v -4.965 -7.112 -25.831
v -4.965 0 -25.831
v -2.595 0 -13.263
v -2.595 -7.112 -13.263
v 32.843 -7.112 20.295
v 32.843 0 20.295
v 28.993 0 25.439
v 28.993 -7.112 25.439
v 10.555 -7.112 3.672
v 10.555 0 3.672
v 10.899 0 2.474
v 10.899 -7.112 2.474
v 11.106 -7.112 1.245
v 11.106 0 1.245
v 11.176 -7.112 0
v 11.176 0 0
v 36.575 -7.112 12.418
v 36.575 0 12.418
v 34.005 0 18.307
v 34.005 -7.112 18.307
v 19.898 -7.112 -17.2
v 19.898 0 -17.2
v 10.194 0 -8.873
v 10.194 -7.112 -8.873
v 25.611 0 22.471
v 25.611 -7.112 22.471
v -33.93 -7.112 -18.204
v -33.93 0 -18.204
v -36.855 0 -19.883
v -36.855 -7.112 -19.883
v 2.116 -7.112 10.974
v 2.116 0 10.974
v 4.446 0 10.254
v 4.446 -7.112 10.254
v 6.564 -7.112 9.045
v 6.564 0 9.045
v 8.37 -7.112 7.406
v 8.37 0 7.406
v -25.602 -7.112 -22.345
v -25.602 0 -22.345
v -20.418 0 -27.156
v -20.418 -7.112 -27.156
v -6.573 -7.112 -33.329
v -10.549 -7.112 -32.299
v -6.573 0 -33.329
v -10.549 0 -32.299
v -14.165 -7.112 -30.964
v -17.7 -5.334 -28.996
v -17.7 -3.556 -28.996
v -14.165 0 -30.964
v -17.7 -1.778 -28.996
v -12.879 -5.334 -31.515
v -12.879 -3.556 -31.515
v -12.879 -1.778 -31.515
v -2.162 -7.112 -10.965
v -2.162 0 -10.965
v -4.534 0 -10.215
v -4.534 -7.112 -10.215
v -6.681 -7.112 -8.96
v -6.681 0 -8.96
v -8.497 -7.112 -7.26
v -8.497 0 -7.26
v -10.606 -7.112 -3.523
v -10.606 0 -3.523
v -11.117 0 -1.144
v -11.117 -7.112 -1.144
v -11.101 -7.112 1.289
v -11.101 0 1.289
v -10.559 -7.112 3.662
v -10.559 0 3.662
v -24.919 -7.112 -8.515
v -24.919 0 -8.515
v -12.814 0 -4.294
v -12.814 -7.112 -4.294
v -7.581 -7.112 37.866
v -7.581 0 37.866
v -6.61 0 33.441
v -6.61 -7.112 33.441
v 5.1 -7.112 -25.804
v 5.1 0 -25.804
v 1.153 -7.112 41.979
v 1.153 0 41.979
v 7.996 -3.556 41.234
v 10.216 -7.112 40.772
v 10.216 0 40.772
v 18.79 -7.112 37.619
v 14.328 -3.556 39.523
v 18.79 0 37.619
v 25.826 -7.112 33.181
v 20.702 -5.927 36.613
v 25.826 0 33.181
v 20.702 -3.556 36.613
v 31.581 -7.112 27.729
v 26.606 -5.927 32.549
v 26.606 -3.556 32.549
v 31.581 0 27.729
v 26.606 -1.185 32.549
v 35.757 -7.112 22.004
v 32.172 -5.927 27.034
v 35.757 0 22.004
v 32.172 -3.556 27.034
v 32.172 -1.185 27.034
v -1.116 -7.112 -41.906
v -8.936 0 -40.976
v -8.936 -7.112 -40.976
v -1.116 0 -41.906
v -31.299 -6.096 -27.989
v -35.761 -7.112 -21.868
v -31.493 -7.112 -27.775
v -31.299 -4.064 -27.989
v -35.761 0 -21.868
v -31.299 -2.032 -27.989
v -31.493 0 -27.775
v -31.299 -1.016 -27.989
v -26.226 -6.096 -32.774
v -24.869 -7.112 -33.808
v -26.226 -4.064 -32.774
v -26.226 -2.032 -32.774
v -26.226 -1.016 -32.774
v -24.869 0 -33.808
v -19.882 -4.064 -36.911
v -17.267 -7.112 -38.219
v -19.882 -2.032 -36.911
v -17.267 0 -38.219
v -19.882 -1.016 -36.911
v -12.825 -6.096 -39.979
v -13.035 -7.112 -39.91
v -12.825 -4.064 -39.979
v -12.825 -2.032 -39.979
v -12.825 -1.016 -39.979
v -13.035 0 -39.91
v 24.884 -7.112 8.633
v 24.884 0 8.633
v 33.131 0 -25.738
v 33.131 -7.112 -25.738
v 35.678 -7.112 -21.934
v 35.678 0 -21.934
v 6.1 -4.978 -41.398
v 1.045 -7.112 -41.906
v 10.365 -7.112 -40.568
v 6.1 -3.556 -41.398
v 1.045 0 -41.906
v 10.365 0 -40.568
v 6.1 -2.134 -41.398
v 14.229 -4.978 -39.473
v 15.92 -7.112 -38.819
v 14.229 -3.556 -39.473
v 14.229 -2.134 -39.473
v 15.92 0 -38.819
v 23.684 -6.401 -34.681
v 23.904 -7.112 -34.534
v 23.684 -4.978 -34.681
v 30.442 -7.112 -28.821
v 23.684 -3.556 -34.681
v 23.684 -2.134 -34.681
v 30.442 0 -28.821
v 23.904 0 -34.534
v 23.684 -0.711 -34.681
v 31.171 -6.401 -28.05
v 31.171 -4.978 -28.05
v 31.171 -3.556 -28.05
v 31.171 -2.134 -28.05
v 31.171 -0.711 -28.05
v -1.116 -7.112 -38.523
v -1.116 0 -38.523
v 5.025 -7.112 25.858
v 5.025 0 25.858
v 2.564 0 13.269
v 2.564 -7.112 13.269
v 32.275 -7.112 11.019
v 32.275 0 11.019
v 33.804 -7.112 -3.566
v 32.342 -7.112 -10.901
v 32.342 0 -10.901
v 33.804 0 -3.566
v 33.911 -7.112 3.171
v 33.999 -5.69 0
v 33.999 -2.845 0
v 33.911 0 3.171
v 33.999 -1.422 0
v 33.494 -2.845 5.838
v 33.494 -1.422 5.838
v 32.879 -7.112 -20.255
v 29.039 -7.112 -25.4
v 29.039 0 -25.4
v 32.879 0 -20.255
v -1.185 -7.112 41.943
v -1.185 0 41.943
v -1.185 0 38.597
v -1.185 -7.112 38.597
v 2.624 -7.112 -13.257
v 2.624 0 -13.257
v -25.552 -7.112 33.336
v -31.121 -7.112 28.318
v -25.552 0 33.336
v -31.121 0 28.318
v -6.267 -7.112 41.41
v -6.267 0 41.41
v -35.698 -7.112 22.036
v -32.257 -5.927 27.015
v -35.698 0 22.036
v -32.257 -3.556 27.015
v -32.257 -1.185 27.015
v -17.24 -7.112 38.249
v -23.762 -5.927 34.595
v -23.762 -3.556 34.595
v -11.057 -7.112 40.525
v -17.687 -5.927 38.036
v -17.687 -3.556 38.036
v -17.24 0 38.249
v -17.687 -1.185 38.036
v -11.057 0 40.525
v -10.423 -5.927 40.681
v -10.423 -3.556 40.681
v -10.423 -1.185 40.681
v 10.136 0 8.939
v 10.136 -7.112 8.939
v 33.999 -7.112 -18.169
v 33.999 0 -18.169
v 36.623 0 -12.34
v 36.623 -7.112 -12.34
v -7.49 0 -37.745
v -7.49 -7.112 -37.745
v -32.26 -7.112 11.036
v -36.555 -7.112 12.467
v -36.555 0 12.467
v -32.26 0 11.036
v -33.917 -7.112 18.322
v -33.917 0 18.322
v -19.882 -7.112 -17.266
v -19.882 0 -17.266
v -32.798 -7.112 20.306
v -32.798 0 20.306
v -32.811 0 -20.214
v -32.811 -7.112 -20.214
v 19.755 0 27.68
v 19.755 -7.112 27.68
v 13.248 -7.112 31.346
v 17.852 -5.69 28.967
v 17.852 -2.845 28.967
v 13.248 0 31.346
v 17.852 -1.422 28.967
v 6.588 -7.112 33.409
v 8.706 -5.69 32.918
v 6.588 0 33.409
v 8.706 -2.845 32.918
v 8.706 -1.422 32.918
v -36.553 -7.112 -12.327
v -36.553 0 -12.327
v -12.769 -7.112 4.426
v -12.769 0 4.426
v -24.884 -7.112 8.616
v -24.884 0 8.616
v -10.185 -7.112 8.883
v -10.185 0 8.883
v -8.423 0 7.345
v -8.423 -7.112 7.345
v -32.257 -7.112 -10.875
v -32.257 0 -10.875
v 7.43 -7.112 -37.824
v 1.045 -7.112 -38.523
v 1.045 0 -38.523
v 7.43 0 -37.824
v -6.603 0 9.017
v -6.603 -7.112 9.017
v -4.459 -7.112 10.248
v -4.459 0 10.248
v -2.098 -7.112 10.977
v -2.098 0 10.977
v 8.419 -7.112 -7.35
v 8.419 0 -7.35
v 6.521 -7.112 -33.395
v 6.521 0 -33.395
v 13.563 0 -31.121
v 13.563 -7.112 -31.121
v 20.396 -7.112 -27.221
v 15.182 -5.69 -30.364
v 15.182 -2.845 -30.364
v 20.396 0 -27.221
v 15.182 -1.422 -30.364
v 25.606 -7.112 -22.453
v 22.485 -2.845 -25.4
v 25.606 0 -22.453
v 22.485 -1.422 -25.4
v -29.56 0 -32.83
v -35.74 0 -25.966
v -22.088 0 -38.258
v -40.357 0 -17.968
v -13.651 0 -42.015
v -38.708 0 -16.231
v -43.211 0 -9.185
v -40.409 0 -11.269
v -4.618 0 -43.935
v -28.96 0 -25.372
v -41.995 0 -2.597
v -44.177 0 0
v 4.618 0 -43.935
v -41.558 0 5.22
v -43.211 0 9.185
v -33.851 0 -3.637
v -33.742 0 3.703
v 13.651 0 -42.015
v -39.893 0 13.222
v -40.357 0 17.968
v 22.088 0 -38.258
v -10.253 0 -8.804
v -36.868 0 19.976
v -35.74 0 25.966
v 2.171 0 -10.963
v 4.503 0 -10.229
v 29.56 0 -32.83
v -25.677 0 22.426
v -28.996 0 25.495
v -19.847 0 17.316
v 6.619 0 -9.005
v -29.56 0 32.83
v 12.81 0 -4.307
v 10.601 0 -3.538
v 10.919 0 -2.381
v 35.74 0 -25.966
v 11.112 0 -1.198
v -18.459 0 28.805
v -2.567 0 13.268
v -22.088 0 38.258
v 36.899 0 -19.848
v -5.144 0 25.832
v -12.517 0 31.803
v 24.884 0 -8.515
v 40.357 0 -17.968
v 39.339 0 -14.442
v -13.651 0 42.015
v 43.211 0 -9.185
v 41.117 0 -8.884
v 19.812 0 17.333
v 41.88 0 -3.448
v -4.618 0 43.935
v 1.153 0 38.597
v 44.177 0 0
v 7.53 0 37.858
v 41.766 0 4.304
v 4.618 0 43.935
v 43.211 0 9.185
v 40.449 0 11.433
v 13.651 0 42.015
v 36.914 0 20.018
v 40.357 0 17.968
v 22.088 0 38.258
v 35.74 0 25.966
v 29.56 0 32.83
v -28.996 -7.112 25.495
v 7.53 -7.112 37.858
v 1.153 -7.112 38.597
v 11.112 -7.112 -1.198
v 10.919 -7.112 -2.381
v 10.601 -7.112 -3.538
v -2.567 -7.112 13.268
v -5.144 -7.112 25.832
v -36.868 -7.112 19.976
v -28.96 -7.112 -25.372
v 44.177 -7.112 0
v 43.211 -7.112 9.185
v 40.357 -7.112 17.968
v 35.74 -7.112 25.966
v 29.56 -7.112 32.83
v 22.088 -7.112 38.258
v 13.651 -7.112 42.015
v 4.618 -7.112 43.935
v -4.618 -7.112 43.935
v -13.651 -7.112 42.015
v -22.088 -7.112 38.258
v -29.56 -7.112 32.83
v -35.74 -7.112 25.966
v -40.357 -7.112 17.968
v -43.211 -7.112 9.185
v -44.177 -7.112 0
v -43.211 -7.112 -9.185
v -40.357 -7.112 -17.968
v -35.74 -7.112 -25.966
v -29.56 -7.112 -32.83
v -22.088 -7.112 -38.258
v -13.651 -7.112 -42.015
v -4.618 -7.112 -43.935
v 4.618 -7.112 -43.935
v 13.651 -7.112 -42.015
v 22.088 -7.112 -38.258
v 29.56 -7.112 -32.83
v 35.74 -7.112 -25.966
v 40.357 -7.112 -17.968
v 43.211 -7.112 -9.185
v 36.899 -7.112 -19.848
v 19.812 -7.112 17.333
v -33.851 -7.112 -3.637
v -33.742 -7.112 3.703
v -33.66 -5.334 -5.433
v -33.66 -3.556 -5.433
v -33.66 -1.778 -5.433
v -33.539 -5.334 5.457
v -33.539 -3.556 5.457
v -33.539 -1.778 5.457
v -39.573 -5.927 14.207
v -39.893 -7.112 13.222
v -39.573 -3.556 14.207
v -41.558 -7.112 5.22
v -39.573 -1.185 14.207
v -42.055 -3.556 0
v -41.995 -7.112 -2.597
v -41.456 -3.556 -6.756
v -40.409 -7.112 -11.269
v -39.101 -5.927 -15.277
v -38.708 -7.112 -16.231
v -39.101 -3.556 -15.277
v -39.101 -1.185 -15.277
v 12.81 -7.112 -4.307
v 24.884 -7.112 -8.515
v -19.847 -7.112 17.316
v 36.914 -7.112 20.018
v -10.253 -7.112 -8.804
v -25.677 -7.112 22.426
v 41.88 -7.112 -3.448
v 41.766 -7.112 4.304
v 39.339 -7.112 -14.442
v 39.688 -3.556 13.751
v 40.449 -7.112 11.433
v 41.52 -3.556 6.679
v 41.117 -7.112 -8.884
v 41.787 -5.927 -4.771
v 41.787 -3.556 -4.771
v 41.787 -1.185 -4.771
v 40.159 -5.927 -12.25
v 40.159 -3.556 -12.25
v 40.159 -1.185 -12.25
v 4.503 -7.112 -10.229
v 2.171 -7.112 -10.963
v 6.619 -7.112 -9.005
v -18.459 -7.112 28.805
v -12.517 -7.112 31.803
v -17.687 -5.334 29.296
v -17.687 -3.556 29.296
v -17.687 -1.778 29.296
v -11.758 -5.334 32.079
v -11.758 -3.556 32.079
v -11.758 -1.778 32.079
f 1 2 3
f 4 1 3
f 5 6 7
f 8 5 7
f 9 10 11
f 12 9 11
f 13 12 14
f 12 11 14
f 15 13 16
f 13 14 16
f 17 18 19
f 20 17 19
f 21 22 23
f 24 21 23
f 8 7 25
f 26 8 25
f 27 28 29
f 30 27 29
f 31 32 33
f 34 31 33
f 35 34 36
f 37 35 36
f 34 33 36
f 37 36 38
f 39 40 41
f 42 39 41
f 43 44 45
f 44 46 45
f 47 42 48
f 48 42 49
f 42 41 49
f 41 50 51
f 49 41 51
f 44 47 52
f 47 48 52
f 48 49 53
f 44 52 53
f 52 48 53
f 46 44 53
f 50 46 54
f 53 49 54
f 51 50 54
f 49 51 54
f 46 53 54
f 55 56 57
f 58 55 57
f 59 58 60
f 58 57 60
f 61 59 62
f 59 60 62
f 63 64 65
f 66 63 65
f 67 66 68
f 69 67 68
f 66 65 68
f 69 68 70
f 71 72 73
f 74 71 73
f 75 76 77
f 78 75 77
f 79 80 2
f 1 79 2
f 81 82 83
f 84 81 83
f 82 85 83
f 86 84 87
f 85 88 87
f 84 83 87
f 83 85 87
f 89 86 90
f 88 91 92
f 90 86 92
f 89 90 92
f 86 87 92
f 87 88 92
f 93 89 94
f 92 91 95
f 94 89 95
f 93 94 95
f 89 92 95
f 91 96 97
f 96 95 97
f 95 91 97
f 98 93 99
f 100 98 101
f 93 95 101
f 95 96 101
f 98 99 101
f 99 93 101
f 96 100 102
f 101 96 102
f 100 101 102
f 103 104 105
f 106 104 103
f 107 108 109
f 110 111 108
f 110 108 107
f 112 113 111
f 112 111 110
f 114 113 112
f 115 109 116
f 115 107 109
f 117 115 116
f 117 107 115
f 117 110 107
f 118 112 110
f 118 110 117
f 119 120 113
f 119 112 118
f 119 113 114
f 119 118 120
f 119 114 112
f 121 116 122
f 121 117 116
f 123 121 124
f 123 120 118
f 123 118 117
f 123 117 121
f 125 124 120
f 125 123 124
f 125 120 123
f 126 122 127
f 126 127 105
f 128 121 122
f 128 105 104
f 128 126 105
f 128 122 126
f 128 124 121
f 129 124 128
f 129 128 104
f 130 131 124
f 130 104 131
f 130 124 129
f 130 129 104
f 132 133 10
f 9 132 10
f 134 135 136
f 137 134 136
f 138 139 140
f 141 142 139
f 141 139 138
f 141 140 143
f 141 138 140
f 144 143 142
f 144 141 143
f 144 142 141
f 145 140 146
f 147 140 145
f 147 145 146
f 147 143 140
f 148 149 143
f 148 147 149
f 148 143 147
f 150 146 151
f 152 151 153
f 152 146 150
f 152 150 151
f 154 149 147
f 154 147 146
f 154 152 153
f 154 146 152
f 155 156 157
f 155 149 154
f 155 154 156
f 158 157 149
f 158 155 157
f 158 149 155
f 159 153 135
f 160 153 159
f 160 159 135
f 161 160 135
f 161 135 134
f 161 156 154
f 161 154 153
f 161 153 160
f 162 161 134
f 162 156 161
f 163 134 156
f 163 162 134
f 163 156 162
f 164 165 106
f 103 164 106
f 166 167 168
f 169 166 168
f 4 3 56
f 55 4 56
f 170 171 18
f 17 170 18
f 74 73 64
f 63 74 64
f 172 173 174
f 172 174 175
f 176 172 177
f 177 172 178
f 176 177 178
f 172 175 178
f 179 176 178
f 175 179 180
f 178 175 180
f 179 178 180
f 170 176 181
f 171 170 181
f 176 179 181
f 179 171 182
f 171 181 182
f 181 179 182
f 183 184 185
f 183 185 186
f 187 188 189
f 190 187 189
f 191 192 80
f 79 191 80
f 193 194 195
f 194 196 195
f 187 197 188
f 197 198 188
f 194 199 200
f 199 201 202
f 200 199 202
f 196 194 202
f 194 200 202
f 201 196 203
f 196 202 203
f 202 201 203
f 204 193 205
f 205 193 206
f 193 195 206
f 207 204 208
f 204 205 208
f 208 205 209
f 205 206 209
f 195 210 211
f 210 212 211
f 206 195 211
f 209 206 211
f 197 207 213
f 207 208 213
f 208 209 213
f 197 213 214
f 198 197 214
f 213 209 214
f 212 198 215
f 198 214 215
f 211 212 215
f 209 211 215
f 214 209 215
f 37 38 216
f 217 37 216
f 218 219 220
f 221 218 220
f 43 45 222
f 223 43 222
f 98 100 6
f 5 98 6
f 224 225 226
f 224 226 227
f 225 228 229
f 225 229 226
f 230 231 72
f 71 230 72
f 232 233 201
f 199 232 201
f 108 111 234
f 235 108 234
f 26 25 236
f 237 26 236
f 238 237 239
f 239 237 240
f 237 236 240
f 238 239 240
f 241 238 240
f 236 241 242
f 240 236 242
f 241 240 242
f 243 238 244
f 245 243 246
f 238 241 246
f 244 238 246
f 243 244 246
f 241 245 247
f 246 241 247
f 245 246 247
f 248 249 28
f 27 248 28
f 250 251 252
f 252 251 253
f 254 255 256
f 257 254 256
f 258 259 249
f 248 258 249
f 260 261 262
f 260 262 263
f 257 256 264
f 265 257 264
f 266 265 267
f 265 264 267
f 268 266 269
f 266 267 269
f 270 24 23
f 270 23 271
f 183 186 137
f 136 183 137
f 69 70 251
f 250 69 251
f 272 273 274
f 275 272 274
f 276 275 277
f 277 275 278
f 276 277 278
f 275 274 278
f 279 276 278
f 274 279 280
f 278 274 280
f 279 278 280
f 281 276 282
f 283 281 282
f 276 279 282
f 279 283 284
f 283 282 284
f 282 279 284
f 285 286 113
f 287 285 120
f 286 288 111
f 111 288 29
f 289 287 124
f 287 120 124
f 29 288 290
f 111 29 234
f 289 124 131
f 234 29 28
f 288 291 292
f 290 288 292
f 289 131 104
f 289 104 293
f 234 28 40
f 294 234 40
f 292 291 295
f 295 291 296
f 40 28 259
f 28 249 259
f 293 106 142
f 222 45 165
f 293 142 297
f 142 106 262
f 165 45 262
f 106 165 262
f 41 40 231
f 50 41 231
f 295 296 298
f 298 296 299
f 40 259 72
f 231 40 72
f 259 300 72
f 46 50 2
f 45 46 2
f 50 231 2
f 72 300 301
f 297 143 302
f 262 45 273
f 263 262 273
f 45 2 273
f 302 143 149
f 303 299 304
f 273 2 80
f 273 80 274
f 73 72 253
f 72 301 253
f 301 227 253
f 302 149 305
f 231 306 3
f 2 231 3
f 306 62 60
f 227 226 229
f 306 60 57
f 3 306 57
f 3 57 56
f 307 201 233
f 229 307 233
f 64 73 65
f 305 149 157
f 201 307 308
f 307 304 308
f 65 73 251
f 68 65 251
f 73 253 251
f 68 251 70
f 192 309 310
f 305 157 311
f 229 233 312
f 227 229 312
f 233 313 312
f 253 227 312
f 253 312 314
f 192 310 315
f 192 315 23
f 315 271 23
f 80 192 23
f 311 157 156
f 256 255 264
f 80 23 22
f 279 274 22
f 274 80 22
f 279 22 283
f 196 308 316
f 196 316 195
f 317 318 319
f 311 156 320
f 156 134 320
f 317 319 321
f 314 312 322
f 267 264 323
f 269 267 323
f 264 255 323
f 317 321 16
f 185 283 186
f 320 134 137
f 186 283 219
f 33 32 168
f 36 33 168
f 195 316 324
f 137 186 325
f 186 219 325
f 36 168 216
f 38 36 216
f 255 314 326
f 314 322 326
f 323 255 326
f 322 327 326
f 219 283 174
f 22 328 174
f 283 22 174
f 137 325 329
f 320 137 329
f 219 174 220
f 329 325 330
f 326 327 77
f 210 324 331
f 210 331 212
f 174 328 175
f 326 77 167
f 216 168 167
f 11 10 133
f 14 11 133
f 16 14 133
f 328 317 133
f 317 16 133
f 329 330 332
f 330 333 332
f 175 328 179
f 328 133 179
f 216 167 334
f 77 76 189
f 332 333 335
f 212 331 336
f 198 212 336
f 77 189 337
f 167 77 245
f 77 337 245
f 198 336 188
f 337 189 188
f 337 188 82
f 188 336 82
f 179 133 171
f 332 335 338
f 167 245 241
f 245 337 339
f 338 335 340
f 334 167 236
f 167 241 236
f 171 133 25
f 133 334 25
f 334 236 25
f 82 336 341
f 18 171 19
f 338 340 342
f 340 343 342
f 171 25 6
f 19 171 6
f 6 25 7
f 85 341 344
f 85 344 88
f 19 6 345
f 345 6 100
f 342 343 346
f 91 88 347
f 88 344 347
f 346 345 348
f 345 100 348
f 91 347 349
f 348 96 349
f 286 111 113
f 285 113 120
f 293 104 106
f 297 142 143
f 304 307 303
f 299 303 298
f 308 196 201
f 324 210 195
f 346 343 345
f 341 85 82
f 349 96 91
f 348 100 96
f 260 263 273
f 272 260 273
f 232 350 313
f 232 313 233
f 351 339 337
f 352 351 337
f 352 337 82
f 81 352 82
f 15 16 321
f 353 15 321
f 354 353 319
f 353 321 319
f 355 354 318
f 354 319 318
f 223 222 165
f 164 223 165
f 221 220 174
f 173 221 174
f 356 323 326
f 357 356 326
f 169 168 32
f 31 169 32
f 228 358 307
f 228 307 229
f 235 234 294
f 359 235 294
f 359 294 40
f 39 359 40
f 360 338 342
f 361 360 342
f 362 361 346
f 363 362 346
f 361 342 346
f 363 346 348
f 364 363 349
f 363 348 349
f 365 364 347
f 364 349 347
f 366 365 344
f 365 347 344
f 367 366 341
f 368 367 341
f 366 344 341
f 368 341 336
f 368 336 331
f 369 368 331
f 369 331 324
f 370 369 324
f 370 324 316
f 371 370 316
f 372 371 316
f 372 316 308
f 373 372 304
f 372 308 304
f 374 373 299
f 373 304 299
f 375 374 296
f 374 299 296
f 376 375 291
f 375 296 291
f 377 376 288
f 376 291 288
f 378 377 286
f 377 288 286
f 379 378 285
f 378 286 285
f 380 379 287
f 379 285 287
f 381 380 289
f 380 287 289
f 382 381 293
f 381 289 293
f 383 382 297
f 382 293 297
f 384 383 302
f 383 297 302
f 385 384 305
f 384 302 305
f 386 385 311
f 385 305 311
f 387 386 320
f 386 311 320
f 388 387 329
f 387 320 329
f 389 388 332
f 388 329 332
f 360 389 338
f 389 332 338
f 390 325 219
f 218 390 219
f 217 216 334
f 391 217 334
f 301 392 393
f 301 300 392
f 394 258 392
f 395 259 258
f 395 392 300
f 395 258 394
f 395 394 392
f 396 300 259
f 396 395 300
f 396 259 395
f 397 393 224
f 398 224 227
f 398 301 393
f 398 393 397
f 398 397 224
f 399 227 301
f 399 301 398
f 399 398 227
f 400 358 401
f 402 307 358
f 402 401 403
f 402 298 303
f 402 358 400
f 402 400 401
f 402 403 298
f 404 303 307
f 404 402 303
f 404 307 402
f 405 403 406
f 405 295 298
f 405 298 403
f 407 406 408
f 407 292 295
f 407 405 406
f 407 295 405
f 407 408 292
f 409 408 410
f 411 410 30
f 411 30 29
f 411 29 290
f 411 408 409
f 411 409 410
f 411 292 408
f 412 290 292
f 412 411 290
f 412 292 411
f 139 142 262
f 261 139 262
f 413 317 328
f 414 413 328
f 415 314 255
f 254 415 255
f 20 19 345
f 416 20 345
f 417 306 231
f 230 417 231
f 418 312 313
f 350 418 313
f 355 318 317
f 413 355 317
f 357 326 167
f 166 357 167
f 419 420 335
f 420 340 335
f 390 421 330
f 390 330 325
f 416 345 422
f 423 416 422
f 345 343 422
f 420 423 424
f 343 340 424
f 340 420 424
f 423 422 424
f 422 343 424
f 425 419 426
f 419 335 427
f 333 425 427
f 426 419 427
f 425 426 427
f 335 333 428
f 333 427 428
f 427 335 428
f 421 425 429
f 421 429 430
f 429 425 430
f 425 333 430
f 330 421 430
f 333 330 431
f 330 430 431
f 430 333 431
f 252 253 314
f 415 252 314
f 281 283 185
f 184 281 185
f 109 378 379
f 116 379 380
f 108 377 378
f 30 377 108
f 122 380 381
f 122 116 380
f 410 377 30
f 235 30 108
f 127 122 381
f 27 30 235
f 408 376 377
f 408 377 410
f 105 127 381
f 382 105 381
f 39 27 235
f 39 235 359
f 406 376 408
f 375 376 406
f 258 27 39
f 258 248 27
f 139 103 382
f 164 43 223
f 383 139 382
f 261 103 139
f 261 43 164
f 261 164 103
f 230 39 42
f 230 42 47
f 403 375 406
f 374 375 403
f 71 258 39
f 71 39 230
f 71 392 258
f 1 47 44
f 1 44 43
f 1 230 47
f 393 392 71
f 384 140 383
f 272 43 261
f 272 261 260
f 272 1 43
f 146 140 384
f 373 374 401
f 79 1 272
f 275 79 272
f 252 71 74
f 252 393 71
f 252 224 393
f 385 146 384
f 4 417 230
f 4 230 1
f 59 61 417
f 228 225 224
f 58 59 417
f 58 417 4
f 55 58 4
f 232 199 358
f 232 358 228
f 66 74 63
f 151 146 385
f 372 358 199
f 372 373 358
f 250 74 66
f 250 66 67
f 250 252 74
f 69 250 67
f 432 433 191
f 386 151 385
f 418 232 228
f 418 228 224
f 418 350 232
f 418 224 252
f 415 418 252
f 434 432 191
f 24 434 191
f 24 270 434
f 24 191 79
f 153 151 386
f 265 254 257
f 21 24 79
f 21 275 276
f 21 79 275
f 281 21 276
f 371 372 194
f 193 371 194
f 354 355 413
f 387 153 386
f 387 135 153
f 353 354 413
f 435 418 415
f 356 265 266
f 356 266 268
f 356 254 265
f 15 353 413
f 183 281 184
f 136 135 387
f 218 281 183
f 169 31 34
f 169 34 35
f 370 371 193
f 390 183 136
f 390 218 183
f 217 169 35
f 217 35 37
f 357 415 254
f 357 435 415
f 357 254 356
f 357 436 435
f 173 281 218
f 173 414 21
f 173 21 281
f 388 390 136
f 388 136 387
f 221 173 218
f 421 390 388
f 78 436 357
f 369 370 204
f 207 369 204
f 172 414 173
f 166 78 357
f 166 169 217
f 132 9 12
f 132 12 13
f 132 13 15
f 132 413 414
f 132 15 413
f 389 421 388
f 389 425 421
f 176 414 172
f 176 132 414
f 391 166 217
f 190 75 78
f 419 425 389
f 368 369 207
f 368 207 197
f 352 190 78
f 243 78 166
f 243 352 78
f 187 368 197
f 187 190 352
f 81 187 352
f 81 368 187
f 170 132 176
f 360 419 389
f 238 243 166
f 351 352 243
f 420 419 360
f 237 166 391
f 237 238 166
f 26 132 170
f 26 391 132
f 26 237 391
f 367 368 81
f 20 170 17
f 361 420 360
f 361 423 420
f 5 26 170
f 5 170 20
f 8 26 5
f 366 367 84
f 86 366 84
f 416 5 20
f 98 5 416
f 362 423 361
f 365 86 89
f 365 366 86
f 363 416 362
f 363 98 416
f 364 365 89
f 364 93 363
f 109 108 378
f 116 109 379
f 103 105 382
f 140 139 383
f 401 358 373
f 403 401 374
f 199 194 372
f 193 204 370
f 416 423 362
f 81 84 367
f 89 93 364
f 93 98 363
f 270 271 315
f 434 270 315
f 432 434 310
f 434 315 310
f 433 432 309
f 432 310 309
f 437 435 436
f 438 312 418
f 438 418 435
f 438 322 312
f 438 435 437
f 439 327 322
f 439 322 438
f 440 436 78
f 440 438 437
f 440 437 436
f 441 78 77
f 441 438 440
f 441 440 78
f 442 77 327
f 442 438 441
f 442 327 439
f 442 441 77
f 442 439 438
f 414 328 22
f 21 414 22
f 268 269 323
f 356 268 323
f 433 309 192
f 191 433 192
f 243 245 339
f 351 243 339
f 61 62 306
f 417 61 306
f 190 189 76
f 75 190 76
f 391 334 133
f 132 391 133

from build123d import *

# Parameters (mm, degrees)
F0_R     = 44.1766957939
F1_DEPTH = 7.112


with BuildPart() as f1:
    # F0 (on Front) → F1 (new body)
    with BuildSketch(Plane.XZ):
        Circle(F0_R)
        with BuildLine():
            Line((-35.7614904642, -21.8675043434), (-32.8106060624, -20.2139895409))
            Line((-32.8106060624, -20.2139895409), (-28.960403055, -25.3720507026))
            Line((-28.960403055, -25.3720507026), (-25.6024971604, -22.3448481411))
            add(Edge.make_bspline(
                [(-25.6024971604, -22.3448481411), (-24.4866790774, -23.5368590352), (-22.204068401, -25.9753360906), (-17.7013799325, -29.0917808365), (-12.9462521926, -31.7846215915), (-8.7627386027, -32.7983811652), (-6.5728682093, -33.3290360868)],
                knots=[0, 0, 0, 0, 0.2355446258, 0.4818497619, 0.7287729939, 1, 1, 1, 1], degree=3))
            Line((-6.5728682093, -33.3290360868), (-7.490250282, -37.7452149987))
            Line((-7.490250282, -37.7452149987), (-1.1156453984, -38.5228171945))
            Line((-1.1156453984, -38.5228171945), (-1.1156453984, -41.9061630964))
            add(Edge.make_bspline(
                [(-35.7614904642, -21.8675043434), (-35.2338448714, -22.7604678514), (-34.0865501542, -24.7020974776), (-31.2890173993, -28.1627256368), (-26.2777085453, -33.0596634812), (-20.0181100974, -37.0541543915), (-12.9599832666, -40.2091309454), (-6.7449542396, -41.4599766224), (-2.9534000516, -41.7605002287), (-1.1156453984, -41.9061630964)],
                knots=[0, 0, 0, 0, 0.1055322762, 0.2294658093, 0.3854964247, 0.5481129391, 0.7120197184, 0.8604168433, 1, 1, 1, 1], degree=3))
        make_face(mode=Mode.SUBTRACT)
        with BuildLine():
            Line((29.0394388139, -25.4001896828), (32.8793115914, -20.255388692))
            Line((32.8793115914, -20.255388692), (35.6775633991, -21.9343416393))
            add(Edge.make_bspline(
                [(1.0446998058, -41.9061630964), (1.4142405393, -41.9243444832), (2.4177240084, -41.9737158229), (6.2635475029, -41.3957263121), (9.9347318114, -40.7048681306), (14.3227087538, -39.6100702965), (19.5640532357, -37.2118500308), (23.7432665832, -34.7364439875), (27.2077761914, -32.1462858648), (31.2241198499, -28.0559070873), (33.2655694418, -25.6975315778), (34.8310406537, -23.2550853619), (35.6775633991, -21.9343416393)],
                knots=[0, 0, 0, 0, 0.0564376647, 0.1532558075, 0.2510560866, 0.3562412055, 0.4759055262, 0.5848852008, 0.689364245, 0.8068772402, 0.8955695847, 1, 1, 1, 1], degree=3))
            Line((1.0446998058, -41.9061630964), (1.0446998058, -38.5228171945))
            Line((1.0446998058, -38.5228171945), (7.4303904548, -37.824023515))
            Line((7.4303904548, -37.824023515), (6.5205958672, -33.3953052759))
            add(Edge.make_bspline(
                [(6.5205958672, -33.3953052759), (7.7992360224, -33.0926907352), (10.5186850112, -32.449081348), (15.2023600967, -30.4614472633), (19.6829738823, -27.9527868768), (22.4818586441, -25.4265122473), (24.5413294263, -23.4663723344), (25.6055921743, -22.453440319)],
                knots=[0, 0, 0, 0, 0.1907843597, 0.4057657128, 0.6200100275, 0.8036344211, 1, 1, 1, 1], degree=3))
            Line((25.6055921743, -22.453440319), (29.0394388139, -25.4001896828))
        make_face(mode=Mode.SUBTRACT)
        with BuildLine():
            Line((-33.9299067855, -18.2043351233), (-36.8553549051, -19.8832862079))
            add(Edge.make_bspline(
                [(-36.8683189154, 19.9755635113), (-37.8473096829, 18.1661673169), (-39.9227314212, 14.3303188905), (-41.4462825011, 6.4196994134), (-42.2825510016, -0.0305786633), (-41.7032306283, -6.7321583358), (-39.3782984167, -15.3221356766), (-37.6167947073, -18.5067030452), (-36.8553549051, -19.8832862079)],
                knots=[0, 0, 0, 0, 0.1604269609, 0.3400988172, 0.5016116203, 0.6671400202, 0.8561156381, 1, 1, 1, 1], degree=3))
            Line((-36.8683189154, 19.9755635113), (-33.9174345136, 18.3220505714))
            Line((-33.9174345136, 18.3220505714), (-36.5551263094, 12.4670509249))
            Line((-36.5551263094, 12.4670509249), (-32.259516418, 11.0363457352))
            add(Edge.make_bspline(
                [(-32.2571396828, -10.874543339), (-32.8195026762, -9.0678543769), (-33.9351137732, -5.4837596226), (-33.931475749, 0.0080421078), (-33.7498900918, 5.4994693455), (-32.7600555231, 9.1767965485), (-32.259516418, 11.0363457352)],
                knots=[0, 0, 0, 0, 0.2512797598, 0.4984867279, 0.7463949913, 1, 1, 1, 1], degree=3))
            Line((-32.2571396828, -10.874543339), (-36.5529023111, -12.326631695))
            Line((-36.5529023111, -12.326631695), (-33.9299067855, -18.2043351233))
        make_face(mode=Mode.SUBTRACT)
        with BuildLine():
            Line((2.1711112191, -10.9630858828), (2.6238481259, -13.2574641479))
            Line((2.6238481259, -13.2574641479), (5.0995848142, -25.8039925247))
            Line((5.0995848142, -25.8039925247), (-4.9646515399, -25.8305668831))
            Line((-4.9646515399, -25.8305668831), (-2.595354112, -13.2630717277))
            Line((-2.595354112, -13.2630717277), (-2.1620836942, -10.9648698168))
            ThreePointArc((-2.1620836942, -10.9648698168), (-5.6421371106, -9.6472413065), (-8.4966954033, -7.2601062819))
            Line((-8.4966954033, -7.2601062819), (-10.2534928431, -8.8040228951))
            Line((-10.2534928431, -8.8040228951), (-19.8817905039, -17.2656066716))
            Line((-19.8817905039, -17.2656066716), (-24.918647483, -8.5147023201))
            Line((-24.918647483, -8.5147023201), (-12.8144619972, -4.2935414687))
            Line((-12.8144619972, -4.2935414687), (-10.6060671452, -3.5233954803))
            ThreePointArc((-10.6060671452, -3.5233954803), (-11.1757611038, 0.0730735954), (-10.5590862727, 3.6617855053))
            Line((-10.5590862727, 3.6617855053), (-12.769271678, 4.4261309782))
            Line((-12.769271678, 4.4261309782), (-24.8842462897, 8.6158365011))
            Line((-24.8842462897, 8.6158365011), (-19.847387448, 17.3158627003))
            Line((-19.847387448, 17.3158627003), (-10.1853755393, 8.8827394279))
            Line((-10.1853755393, 8.8827394279), (-8.4234761864, 7.3449319219))
            ThreePointArc((-8.4234761864, 7.3449319219), (-5.5652229601, 9.6918145569), (-2.0975513649, 10.9773974271))
            Line((-2.0975513649, 10.9773974271), (-2.567479075, 13.2684959894))
            Line((-2.567479075, 13.2684959894), (-5.1443860866, 25.8320197463))
            Line((-5.1443860866, 25.8320197463), (5.0252802209, 25.857816598))
            Line((5.0252802209, 25.857816598), (2.5644704001, 13.2690778198))
            Line((2.5644704001, 13.2690778198), (2.1158141978, 10.9738920297))
            ThreePointArc((2.1158141978, 10.9738920297), (5.5380334394, 9.7073766603), (8.3698544885, 7.4059781151))
            Line((8.3698544885, 7.4059781151), (10.1363668293, 8.9386241739))
            Line((10.1363668293, 8.9386241739), (19.8115911335, 17.3329580575))
            Line((19.8115911335, 17.3329580575), (24.8837284744, 8.6329318583))
            Line((24.8837284744, 8.6329318583), (12.7654122958, 4.4372495467))
            Line((12.7654122958, 4.4372495467), (10.5554972691, 3.6721183807))
            ThreePointArc((10.5554972691, 3.6721183807), (11.0197825178, 1.8620873396), (11.176, 0))
            ThreePointArc((11.176, 0), (11.0313792921, -1.7921068369), (10.6012600367, -3.5378329008))
            Line((10.6012600367, -3.5378329008), (12.8098029544, -4.3074218382))
            Line((12.8098029544, -4.3074218382), (24.8837284744, -8.5147023201))
            Line((24.8837284744, -8.5147023201), (19.8977496475, -17.2002650797))
            Line((19.8977496475, -17.2002650797), (10.1939157276, -8.8729373243))
            Line((10.1939157276, -8.8729373243), (8.419132603, -7.3499103541))
            ThreePointArc((8.419132603, -7.3499103541), (5.5948257706, -9.6747558417), (2.1711112191, -10.9630858828))
        make_face(mode=Mode.SUBTRACT)
        with BuildLine():
            add(Edge.make_bspline(
                [(-35.6981419027, 22.0360960811), (-34.6319390776, 23.7268379349), (-32.484600451, 27.1320017598), (-27.9146496351, 31.5478201486), (-23.8299996259, 34.7154749769), (-17.6296681743, 38.2638751465), (-10.4512096865, 41.0851595996), (-4.3688276658, 41.648307375), (-1.1853148462, 41.9430583715)],
                knots=[0, 0, 0, 0, 0.1566037405, 0.3154008348, 0.4604208672, 0.6286242725, 0.8056223063, 1, 1, 1, 1], degree=3))
            Line((-1.1853148462, 41.9430583715), (-1.1853148462, 38.5973155499))
            Line((-1.1853148462, 38.5973155499), (-7.5810640119, 37.8660485148))
            Line((-7.5810640119, 37.8660485148), (-6.6097197123, 33.4410332143))
            add(Edge.make_bspline(
                [(-25.6765991733, 22.4260363519), (-24.3333432454, 23.7606678176), (-21.7133494369, 26.3638397849), (-17.8323338836, 29.4743374528), (-11.8037332381, 32.3002630954), (-8.2803244864, 33.0741154161), (-6.6097197123, 33.4410332143)],
                knots=[0, 0, 0, 0, 0.2489268939, 0.4855269254, 0.7560654369, 1, 1, 1, 1], degree=3))
            Line((-25.6765991733, 22.4260363519), (-28.9963893592, 25.4952777177))
            Line((-28.9963893592, 25.4952777177), (-32.7981300652, 20.3062668443))
            Line((-32.7981300652, 20.3062668443), (-35.6981419027, 22.0360960811))
        make_face(mode=Mode.SUBTRACT)
        with BuildLine():
            Line((36.574523896, 12.4182878062), (34.0049043298, 18.3071866632))
            Line((34.0049043298, 18.3071866632), (36.9141213596, 20.0184900314))
            add(Edge.make_bspline(
                [(36.9141213596, 20.0184900314), (37.8938705727, 18.0039971875), (39.8850886304, 13.9097917787), (41.7594651651, 6.715363759), (41.8651560314, 1.397564654), (42.0610136055, -4.9001243802), (40.4255886988, -12.4247769104), (38.0893073425, -17.3422025728), (36.8986204267, -19.8483709246)],
                knots=[0, 0, 0, 0, 0.1662522108, 0.3378868794, 0.484123471, 0.6417151571, 0.8173999576, 1, 1, 1, 1], degree=3))
            Line((36.8986204267, -19.8483709246), (33.9986123145, -18.1694179773))
            Line((33.9986123145, -18.1694179773), (36.6232842207, -12.3396720737))
            Line((36.6232842207, -12.3396720737), (32.3421731591, -10.9006436542))
            add(Edge.make_bspline(
                [(32.3421731591, -10.9006436542), (32.8221995517, -9.1892580119), (33.7840723972, -5.7599978652), (34.001178244, -0.020287475), (34.0713324341, 2.1855798208), (33.5478638453, 6.0205740931), (32.7250879437, 9.2526276599), (32.2753861547, 11.0191600397)],
                knots=[0, 0, 0, 0, 0.2254438377, 0.4517424647, 0.5945217901, 0.7783791722, 1, 1, 1, 1], degree=3))
            Line((32.2753861547, 11.0191600397), (36.574523896, 12.4182878062))
        make_face(mode=Mode.SUBTRACT)
        with BuildLine():
            Line((1.1531068012, 38.5973155499), (1.1531068012, 41.9790335))
            add(Edge.make_bspline(
                [(1.1531068012, 41.9790335), (3.4652329605, 41.7997953198), (8.0343743744, 41.4455912082), (14.3842373709, 39.6875593474), (20.8604600663, 36.7642913447), (26.7090201677, 32.7528107578), (32.3502142279, 27.2160608198), (34.6669622808, 23.6708778177), (35.7565619051, 22.0035277307)],
                knots=[0, 0, 0, 0, 0.1661180396, 0.3282765568, 0.4958824441, 0.6653985731, 0.8426321806, 1, 1, 1, 1], degree=3))
            Line((35.7565619051, 22.0035277307), (32.842528075, 20.2946811914))
            Line((32.842528075, 20.2946811914), (28.9931260049, 25.4392083734))
            Line((28.9931260049, 25.4392083734), (25.6114080548, 22.4712118506))
            add(Edge.make_bspline(
                [(25.6114080548, 22.4712118506), (24.5168671139, 23.6090766646), (22.278164541, 25.9363910587), (17.811051605, 29.0791098257), (14.3612187846, 31.0432744902), (8.7915992704, 32.9829132835), (7.1957498764, 33.2913618908), (6.5884473734, 33.408742398)],
                knots=[0, 0, 0, 0, 0.211003518, 0.4315728183, 0.6286921316, 0.8586983216, 1, 1, 1, 1], degree=3))
            Line((6.5884473734, 33.408742398), (7.529664319, 37.858132273))
            Line((7.529664319, 37.858132273), (1.1531068012, 38.5973155499))
        make_face(mode=Mode.SUBTRACT)
    extrude(amount=F1_DEPTH)


solid = f1.part
